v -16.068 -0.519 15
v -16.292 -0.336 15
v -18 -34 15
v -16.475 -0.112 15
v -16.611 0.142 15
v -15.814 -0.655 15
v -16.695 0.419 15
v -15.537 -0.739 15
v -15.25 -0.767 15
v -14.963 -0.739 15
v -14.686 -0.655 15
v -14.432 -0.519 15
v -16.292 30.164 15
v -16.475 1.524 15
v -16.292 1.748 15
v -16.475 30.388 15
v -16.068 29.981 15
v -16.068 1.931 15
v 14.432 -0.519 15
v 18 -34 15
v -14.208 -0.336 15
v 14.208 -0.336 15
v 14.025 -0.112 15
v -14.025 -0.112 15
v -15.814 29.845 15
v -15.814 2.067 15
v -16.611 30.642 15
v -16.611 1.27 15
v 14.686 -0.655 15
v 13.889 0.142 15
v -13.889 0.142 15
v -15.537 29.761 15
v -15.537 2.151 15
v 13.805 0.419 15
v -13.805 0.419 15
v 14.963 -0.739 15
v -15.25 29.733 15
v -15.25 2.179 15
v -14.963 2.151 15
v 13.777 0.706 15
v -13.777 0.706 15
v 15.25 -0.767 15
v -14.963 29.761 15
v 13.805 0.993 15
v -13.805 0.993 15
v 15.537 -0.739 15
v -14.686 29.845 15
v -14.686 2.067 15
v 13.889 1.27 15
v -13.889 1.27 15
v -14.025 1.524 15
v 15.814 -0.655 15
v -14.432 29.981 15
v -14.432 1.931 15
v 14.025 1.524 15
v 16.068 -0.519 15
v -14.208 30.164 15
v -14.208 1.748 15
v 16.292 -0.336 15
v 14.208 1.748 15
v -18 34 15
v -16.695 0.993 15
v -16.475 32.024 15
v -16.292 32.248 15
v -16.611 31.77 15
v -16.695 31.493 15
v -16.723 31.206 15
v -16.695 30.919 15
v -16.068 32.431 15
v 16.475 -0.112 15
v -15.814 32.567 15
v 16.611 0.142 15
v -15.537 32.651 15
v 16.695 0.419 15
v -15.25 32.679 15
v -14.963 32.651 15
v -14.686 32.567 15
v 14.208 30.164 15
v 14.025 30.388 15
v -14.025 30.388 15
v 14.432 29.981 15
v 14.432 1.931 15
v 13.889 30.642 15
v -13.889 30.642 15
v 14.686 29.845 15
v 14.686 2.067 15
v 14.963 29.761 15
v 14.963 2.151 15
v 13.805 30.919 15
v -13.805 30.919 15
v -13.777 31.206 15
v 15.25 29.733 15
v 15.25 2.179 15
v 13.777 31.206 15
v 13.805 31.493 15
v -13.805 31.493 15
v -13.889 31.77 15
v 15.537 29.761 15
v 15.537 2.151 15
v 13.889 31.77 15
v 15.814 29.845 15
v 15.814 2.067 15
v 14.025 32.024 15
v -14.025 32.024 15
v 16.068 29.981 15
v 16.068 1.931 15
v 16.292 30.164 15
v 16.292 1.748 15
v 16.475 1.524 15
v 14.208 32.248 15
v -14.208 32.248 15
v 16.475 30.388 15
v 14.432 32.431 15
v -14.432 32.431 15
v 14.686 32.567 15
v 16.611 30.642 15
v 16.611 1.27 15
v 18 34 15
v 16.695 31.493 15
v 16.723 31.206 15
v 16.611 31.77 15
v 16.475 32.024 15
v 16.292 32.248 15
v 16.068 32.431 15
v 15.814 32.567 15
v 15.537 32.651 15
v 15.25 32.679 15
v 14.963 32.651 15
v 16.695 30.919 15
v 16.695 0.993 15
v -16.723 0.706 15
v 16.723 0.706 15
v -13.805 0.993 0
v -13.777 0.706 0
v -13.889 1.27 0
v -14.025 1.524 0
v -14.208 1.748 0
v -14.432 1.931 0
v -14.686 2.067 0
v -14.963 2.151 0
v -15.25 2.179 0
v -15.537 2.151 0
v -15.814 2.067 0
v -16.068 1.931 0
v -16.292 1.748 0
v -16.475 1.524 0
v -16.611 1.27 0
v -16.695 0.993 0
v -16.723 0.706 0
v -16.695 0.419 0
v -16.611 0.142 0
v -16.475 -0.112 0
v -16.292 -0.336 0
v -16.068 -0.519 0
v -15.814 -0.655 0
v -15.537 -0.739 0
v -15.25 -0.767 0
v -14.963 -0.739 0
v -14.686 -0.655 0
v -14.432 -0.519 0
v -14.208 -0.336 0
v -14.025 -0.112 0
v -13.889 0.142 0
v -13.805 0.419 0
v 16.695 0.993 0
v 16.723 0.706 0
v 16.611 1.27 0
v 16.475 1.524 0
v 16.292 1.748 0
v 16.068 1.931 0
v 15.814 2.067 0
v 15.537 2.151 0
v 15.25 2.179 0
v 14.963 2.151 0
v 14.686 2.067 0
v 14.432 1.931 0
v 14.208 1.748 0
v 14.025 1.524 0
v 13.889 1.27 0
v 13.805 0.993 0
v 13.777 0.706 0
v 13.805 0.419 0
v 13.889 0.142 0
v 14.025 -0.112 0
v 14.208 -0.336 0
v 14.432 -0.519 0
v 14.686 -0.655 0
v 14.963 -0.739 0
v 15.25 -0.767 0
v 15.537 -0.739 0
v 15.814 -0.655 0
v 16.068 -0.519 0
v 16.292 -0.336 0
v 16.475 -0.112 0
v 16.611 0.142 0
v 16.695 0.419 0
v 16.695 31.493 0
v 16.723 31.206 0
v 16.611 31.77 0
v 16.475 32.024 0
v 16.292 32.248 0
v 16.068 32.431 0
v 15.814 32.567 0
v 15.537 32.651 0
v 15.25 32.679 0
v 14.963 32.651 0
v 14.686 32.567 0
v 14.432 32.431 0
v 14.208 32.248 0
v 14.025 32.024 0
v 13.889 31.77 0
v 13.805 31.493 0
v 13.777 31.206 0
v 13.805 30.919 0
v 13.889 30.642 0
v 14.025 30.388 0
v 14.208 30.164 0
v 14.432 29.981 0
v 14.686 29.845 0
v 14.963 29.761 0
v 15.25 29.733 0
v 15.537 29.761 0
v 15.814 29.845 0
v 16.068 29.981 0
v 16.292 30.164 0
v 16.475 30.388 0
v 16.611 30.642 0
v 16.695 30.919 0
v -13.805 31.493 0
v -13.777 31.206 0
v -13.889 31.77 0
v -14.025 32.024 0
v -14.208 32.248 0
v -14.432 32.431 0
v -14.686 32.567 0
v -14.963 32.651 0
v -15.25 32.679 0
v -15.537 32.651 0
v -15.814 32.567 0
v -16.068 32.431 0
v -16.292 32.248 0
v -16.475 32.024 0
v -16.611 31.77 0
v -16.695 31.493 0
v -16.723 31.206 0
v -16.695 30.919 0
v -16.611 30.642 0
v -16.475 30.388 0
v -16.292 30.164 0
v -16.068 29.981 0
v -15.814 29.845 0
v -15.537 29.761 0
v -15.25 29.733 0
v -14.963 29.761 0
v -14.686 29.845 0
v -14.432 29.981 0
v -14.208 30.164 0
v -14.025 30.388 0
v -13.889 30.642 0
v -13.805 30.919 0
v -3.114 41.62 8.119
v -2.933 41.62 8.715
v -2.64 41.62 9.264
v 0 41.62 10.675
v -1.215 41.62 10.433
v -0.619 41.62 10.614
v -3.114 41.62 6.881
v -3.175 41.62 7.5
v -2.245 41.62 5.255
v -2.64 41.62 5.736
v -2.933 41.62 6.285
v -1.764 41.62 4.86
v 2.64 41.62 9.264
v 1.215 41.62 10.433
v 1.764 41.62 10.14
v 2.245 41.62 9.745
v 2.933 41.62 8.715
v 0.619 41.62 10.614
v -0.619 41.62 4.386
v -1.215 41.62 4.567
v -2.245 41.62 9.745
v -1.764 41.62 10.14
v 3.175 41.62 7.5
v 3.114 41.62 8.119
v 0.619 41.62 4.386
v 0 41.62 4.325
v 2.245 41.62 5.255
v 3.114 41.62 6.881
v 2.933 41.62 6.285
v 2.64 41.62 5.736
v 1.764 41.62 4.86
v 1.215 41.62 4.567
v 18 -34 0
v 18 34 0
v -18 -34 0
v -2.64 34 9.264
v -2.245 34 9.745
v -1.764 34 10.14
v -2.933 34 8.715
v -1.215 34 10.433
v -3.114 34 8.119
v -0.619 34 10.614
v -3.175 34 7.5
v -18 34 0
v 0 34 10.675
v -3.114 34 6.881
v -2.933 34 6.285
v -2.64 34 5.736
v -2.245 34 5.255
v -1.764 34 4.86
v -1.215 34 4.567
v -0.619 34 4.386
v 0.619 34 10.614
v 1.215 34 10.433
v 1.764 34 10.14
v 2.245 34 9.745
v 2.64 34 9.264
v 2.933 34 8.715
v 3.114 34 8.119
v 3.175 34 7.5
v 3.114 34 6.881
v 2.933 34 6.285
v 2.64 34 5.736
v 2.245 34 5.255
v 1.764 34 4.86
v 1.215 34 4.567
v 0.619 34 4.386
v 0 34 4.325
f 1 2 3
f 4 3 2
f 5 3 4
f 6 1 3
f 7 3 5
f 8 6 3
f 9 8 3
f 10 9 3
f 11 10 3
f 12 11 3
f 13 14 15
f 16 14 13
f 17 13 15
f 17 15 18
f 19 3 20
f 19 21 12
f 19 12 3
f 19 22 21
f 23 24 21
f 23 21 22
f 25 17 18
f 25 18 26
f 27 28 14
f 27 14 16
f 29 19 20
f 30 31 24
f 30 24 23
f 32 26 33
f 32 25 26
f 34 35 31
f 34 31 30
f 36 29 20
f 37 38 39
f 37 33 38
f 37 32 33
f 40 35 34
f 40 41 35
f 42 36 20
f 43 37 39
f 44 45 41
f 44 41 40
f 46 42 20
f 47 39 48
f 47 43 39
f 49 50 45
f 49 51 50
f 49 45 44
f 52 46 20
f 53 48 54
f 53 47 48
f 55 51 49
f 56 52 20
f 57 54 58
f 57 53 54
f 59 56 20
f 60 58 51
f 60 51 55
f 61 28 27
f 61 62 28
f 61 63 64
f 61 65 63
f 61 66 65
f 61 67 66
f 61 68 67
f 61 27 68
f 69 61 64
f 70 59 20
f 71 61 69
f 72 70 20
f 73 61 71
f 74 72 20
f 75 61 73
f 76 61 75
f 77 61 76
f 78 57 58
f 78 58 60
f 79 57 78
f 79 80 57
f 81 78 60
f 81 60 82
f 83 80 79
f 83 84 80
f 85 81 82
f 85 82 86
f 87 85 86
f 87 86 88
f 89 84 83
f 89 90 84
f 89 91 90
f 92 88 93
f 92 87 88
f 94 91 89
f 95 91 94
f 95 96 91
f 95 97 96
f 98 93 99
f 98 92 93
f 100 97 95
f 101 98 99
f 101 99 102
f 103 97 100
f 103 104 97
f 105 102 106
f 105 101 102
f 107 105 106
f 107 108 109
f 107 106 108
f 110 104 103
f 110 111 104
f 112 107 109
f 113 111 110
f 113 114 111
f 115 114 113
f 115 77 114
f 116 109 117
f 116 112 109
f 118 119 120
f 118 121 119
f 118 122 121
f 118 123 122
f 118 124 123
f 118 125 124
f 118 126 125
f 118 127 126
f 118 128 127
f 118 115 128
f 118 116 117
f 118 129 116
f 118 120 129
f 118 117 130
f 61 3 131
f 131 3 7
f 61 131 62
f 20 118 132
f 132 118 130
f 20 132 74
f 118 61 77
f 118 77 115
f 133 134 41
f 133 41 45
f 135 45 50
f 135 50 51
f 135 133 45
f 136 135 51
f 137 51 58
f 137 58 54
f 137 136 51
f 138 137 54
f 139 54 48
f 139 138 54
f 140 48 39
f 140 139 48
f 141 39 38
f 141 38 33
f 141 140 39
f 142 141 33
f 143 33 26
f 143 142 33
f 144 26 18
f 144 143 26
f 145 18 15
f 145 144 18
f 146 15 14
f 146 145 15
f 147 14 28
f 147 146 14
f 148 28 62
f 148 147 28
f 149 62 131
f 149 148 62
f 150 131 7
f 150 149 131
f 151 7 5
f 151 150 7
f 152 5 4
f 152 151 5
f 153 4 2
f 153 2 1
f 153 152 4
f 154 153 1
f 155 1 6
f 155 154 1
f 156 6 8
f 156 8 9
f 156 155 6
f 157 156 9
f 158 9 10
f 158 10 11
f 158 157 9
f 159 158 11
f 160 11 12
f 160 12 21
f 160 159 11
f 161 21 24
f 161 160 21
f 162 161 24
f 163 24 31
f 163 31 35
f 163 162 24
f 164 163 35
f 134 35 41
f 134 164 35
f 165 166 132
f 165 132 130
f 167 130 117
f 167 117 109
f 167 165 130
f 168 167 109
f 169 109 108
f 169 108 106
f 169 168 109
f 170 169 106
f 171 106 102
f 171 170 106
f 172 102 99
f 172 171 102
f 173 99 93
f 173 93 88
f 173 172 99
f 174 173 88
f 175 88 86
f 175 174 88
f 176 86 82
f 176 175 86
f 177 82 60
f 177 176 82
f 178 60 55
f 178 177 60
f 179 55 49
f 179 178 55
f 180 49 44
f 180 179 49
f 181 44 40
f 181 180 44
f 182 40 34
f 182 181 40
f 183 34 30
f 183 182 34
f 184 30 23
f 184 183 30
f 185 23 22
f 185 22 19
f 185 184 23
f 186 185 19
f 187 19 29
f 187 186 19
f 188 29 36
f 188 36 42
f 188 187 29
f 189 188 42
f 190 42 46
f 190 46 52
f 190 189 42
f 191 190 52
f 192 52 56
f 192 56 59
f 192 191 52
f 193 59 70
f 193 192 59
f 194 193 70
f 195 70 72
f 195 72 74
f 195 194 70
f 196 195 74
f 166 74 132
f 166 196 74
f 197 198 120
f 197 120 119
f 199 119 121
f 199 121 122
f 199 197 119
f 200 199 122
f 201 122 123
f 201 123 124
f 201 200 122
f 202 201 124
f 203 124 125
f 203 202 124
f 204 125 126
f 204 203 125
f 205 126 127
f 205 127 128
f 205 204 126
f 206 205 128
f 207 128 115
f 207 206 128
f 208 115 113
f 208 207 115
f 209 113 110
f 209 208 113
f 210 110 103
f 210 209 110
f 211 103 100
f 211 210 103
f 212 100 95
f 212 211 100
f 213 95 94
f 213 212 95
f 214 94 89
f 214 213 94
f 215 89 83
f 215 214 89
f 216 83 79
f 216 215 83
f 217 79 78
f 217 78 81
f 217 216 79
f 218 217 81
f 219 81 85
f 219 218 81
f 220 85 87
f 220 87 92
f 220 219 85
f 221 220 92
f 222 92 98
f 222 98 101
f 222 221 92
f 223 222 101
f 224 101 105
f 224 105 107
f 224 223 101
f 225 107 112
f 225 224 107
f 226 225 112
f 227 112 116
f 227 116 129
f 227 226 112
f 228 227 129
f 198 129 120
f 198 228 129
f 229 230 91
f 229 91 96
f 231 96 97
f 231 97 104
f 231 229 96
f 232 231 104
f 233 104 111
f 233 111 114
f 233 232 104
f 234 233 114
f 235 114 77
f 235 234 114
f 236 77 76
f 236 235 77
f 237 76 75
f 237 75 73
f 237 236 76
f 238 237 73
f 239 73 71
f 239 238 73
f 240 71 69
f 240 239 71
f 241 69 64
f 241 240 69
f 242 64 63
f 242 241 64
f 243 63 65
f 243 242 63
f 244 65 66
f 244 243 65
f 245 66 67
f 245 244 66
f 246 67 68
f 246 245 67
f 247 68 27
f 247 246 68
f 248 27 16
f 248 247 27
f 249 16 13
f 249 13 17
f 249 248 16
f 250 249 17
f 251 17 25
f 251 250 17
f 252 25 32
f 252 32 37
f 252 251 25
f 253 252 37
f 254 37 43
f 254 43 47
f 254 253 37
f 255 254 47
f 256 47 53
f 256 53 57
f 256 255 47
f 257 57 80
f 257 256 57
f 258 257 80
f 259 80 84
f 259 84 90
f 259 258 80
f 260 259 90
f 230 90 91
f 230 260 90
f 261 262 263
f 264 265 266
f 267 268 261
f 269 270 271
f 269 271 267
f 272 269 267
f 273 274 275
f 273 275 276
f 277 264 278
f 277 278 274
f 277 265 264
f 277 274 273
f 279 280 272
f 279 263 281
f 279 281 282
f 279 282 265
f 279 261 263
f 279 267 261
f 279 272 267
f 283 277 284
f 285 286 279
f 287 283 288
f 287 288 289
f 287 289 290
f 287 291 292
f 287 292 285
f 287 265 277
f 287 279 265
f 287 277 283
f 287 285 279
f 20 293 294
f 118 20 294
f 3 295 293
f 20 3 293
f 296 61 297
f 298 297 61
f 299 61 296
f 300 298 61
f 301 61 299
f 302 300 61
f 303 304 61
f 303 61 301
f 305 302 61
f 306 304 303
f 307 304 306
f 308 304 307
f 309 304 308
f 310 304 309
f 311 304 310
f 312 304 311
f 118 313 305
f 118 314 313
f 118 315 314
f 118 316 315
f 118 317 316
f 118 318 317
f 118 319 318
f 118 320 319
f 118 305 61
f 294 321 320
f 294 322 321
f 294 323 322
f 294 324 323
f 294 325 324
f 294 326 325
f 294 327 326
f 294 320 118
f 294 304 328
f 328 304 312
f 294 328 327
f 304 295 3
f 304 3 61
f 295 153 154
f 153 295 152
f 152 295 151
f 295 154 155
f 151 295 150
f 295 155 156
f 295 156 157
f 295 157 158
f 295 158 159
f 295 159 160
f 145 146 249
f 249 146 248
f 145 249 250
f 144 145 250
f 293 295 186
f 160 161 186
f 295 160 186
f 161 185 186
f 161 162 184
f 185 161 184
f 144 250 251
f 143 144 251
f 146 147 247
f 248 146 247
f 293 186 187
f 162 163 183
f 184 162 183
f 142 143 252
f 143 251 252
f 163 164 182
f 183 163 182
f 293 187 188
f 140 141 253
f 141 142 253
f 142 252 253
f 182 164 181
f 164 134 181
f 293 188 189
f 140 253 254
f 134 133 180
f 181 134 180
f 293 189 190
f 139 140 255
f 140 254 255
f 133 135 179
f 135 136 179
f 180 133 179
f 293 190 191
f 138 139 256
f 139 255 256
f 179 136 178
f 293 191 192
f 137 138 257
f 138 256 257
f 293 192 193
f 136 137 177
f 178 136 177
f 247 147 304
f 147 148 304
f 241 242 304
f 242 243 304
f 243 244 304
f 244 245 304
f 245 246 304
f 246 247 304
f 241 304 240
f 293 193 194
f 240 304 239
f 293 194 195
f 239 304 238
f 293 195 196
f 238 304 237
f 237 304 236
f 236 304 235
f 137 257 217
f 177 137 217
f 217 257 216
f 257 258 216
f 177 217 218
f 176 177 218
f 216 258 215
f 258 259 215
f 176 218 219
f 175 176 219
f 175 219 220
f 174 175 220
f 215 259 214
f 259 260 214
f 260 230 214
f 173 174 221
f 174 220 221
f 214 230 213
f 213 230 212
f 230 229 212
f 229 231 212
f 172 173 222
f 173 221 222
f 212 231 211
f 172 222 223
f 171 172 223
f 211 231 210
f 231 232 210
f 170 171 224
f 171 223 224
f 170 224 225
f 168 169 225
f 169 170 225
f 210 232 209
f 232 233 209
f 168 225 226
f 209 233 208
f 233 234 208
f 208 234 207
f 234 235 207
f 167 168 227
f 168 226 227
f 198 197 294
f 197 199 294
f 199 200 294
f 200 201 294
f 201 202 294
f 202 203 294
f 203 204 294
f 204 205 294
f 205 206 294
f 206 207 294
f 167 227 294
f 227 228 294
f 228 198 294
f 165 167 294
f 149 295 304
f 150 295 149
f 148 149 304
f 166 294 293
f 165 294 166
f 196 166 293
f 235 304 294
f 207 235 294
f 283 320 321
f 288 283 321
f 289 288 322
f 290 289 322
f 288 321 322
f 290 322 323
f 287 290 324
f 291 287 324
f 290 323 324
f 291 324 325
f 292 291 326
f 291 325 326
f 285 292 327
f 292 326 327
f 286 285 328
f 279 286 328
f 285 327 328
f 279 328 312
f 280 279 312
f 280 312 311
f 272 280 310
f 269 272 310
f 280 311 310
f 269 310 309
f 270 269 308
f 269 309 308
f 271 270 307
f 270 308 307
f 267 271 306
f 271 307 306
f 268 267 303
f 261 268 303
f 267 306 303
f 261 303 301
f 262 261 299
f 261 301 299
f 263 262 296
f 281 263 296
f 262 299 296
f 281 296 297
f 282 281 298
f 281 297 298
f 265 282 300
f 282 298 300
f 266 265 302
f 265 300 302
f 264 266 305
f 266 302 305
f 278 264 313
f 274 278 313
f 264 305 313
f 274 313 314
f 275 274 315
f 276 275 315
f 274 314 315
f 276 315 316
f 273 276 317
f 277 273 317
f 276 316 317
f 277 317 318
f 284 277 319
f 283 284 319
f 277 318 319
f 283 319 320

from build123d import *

# Parameters (mm, degrees)
SKETCH1_W                          = 36
SKETCH1_H                          = 68
BOSS_EXTRUDE1_DEPTH                = 15
F_1_16_0_116_DOWEL_HOLE1_OUTLINE_R = 1.4732
F_1_16_0_116_DOWEL_HOLE1_DEPTH     = 15
SKETCH5_R                          = 3.175
BOSS_EXTRUDE2_DEPTH                = 7.62


# Read off the part's stored shape, not the designer's step: 1/16 (0.116) Dowel Hole1
with BuildPart() as part:
    # Sketch1 → Boss-Extrude1 (new body)
    with BuildSketch(Plane.XY):
        Rectangle(SKETCH1_W, SKETCH1_H)
    extrude(amount=BOSS_EXTRUDE1_DEPTH)

    # 1/16 (0.116) Dowel Hole1 outline → 1/16 (0.116) Dowel Hole1 (cut)
    with BuildSketch(Plane.XY):
        with Locations((15.25, 31.206)):
            Circle(F_1_16_0_116_DOWEL_HOLE1_OUTLINE_R)
        with Locations((-15.25, 0.706)):
            Circle(F_1_16_0_116_DOWEL_HOLE1_OUTLINE_R)
        with Locations((15.25, 0.706)):
            Circle(F_1_16_0_116_DOWEL_HOLE1_OUTLINE_R)
        with Locations((-15.25, 31.206)):
            Circle(F_1_16_0_116_DOWEL_HOLE1_OUTLINE_R)
    extrude(amount=F_1_16_0_116_DOWEL_HOLE1_DEPTH, mode=Mode.SUBTRACT)

    # Sketch5 → Boss-Extrude2 (add)
    with BuildSketch(Plane(origin=(0, 34, 0), x_dir=(1, 0, 0), z_dir=(0, 1, 0))):
        with Locations((0, -7.5)):
            Circle(SKETCH5_R)
    extrude(amount=BOSS_EXTRUDE2_DEPTH)


solid = part.part
